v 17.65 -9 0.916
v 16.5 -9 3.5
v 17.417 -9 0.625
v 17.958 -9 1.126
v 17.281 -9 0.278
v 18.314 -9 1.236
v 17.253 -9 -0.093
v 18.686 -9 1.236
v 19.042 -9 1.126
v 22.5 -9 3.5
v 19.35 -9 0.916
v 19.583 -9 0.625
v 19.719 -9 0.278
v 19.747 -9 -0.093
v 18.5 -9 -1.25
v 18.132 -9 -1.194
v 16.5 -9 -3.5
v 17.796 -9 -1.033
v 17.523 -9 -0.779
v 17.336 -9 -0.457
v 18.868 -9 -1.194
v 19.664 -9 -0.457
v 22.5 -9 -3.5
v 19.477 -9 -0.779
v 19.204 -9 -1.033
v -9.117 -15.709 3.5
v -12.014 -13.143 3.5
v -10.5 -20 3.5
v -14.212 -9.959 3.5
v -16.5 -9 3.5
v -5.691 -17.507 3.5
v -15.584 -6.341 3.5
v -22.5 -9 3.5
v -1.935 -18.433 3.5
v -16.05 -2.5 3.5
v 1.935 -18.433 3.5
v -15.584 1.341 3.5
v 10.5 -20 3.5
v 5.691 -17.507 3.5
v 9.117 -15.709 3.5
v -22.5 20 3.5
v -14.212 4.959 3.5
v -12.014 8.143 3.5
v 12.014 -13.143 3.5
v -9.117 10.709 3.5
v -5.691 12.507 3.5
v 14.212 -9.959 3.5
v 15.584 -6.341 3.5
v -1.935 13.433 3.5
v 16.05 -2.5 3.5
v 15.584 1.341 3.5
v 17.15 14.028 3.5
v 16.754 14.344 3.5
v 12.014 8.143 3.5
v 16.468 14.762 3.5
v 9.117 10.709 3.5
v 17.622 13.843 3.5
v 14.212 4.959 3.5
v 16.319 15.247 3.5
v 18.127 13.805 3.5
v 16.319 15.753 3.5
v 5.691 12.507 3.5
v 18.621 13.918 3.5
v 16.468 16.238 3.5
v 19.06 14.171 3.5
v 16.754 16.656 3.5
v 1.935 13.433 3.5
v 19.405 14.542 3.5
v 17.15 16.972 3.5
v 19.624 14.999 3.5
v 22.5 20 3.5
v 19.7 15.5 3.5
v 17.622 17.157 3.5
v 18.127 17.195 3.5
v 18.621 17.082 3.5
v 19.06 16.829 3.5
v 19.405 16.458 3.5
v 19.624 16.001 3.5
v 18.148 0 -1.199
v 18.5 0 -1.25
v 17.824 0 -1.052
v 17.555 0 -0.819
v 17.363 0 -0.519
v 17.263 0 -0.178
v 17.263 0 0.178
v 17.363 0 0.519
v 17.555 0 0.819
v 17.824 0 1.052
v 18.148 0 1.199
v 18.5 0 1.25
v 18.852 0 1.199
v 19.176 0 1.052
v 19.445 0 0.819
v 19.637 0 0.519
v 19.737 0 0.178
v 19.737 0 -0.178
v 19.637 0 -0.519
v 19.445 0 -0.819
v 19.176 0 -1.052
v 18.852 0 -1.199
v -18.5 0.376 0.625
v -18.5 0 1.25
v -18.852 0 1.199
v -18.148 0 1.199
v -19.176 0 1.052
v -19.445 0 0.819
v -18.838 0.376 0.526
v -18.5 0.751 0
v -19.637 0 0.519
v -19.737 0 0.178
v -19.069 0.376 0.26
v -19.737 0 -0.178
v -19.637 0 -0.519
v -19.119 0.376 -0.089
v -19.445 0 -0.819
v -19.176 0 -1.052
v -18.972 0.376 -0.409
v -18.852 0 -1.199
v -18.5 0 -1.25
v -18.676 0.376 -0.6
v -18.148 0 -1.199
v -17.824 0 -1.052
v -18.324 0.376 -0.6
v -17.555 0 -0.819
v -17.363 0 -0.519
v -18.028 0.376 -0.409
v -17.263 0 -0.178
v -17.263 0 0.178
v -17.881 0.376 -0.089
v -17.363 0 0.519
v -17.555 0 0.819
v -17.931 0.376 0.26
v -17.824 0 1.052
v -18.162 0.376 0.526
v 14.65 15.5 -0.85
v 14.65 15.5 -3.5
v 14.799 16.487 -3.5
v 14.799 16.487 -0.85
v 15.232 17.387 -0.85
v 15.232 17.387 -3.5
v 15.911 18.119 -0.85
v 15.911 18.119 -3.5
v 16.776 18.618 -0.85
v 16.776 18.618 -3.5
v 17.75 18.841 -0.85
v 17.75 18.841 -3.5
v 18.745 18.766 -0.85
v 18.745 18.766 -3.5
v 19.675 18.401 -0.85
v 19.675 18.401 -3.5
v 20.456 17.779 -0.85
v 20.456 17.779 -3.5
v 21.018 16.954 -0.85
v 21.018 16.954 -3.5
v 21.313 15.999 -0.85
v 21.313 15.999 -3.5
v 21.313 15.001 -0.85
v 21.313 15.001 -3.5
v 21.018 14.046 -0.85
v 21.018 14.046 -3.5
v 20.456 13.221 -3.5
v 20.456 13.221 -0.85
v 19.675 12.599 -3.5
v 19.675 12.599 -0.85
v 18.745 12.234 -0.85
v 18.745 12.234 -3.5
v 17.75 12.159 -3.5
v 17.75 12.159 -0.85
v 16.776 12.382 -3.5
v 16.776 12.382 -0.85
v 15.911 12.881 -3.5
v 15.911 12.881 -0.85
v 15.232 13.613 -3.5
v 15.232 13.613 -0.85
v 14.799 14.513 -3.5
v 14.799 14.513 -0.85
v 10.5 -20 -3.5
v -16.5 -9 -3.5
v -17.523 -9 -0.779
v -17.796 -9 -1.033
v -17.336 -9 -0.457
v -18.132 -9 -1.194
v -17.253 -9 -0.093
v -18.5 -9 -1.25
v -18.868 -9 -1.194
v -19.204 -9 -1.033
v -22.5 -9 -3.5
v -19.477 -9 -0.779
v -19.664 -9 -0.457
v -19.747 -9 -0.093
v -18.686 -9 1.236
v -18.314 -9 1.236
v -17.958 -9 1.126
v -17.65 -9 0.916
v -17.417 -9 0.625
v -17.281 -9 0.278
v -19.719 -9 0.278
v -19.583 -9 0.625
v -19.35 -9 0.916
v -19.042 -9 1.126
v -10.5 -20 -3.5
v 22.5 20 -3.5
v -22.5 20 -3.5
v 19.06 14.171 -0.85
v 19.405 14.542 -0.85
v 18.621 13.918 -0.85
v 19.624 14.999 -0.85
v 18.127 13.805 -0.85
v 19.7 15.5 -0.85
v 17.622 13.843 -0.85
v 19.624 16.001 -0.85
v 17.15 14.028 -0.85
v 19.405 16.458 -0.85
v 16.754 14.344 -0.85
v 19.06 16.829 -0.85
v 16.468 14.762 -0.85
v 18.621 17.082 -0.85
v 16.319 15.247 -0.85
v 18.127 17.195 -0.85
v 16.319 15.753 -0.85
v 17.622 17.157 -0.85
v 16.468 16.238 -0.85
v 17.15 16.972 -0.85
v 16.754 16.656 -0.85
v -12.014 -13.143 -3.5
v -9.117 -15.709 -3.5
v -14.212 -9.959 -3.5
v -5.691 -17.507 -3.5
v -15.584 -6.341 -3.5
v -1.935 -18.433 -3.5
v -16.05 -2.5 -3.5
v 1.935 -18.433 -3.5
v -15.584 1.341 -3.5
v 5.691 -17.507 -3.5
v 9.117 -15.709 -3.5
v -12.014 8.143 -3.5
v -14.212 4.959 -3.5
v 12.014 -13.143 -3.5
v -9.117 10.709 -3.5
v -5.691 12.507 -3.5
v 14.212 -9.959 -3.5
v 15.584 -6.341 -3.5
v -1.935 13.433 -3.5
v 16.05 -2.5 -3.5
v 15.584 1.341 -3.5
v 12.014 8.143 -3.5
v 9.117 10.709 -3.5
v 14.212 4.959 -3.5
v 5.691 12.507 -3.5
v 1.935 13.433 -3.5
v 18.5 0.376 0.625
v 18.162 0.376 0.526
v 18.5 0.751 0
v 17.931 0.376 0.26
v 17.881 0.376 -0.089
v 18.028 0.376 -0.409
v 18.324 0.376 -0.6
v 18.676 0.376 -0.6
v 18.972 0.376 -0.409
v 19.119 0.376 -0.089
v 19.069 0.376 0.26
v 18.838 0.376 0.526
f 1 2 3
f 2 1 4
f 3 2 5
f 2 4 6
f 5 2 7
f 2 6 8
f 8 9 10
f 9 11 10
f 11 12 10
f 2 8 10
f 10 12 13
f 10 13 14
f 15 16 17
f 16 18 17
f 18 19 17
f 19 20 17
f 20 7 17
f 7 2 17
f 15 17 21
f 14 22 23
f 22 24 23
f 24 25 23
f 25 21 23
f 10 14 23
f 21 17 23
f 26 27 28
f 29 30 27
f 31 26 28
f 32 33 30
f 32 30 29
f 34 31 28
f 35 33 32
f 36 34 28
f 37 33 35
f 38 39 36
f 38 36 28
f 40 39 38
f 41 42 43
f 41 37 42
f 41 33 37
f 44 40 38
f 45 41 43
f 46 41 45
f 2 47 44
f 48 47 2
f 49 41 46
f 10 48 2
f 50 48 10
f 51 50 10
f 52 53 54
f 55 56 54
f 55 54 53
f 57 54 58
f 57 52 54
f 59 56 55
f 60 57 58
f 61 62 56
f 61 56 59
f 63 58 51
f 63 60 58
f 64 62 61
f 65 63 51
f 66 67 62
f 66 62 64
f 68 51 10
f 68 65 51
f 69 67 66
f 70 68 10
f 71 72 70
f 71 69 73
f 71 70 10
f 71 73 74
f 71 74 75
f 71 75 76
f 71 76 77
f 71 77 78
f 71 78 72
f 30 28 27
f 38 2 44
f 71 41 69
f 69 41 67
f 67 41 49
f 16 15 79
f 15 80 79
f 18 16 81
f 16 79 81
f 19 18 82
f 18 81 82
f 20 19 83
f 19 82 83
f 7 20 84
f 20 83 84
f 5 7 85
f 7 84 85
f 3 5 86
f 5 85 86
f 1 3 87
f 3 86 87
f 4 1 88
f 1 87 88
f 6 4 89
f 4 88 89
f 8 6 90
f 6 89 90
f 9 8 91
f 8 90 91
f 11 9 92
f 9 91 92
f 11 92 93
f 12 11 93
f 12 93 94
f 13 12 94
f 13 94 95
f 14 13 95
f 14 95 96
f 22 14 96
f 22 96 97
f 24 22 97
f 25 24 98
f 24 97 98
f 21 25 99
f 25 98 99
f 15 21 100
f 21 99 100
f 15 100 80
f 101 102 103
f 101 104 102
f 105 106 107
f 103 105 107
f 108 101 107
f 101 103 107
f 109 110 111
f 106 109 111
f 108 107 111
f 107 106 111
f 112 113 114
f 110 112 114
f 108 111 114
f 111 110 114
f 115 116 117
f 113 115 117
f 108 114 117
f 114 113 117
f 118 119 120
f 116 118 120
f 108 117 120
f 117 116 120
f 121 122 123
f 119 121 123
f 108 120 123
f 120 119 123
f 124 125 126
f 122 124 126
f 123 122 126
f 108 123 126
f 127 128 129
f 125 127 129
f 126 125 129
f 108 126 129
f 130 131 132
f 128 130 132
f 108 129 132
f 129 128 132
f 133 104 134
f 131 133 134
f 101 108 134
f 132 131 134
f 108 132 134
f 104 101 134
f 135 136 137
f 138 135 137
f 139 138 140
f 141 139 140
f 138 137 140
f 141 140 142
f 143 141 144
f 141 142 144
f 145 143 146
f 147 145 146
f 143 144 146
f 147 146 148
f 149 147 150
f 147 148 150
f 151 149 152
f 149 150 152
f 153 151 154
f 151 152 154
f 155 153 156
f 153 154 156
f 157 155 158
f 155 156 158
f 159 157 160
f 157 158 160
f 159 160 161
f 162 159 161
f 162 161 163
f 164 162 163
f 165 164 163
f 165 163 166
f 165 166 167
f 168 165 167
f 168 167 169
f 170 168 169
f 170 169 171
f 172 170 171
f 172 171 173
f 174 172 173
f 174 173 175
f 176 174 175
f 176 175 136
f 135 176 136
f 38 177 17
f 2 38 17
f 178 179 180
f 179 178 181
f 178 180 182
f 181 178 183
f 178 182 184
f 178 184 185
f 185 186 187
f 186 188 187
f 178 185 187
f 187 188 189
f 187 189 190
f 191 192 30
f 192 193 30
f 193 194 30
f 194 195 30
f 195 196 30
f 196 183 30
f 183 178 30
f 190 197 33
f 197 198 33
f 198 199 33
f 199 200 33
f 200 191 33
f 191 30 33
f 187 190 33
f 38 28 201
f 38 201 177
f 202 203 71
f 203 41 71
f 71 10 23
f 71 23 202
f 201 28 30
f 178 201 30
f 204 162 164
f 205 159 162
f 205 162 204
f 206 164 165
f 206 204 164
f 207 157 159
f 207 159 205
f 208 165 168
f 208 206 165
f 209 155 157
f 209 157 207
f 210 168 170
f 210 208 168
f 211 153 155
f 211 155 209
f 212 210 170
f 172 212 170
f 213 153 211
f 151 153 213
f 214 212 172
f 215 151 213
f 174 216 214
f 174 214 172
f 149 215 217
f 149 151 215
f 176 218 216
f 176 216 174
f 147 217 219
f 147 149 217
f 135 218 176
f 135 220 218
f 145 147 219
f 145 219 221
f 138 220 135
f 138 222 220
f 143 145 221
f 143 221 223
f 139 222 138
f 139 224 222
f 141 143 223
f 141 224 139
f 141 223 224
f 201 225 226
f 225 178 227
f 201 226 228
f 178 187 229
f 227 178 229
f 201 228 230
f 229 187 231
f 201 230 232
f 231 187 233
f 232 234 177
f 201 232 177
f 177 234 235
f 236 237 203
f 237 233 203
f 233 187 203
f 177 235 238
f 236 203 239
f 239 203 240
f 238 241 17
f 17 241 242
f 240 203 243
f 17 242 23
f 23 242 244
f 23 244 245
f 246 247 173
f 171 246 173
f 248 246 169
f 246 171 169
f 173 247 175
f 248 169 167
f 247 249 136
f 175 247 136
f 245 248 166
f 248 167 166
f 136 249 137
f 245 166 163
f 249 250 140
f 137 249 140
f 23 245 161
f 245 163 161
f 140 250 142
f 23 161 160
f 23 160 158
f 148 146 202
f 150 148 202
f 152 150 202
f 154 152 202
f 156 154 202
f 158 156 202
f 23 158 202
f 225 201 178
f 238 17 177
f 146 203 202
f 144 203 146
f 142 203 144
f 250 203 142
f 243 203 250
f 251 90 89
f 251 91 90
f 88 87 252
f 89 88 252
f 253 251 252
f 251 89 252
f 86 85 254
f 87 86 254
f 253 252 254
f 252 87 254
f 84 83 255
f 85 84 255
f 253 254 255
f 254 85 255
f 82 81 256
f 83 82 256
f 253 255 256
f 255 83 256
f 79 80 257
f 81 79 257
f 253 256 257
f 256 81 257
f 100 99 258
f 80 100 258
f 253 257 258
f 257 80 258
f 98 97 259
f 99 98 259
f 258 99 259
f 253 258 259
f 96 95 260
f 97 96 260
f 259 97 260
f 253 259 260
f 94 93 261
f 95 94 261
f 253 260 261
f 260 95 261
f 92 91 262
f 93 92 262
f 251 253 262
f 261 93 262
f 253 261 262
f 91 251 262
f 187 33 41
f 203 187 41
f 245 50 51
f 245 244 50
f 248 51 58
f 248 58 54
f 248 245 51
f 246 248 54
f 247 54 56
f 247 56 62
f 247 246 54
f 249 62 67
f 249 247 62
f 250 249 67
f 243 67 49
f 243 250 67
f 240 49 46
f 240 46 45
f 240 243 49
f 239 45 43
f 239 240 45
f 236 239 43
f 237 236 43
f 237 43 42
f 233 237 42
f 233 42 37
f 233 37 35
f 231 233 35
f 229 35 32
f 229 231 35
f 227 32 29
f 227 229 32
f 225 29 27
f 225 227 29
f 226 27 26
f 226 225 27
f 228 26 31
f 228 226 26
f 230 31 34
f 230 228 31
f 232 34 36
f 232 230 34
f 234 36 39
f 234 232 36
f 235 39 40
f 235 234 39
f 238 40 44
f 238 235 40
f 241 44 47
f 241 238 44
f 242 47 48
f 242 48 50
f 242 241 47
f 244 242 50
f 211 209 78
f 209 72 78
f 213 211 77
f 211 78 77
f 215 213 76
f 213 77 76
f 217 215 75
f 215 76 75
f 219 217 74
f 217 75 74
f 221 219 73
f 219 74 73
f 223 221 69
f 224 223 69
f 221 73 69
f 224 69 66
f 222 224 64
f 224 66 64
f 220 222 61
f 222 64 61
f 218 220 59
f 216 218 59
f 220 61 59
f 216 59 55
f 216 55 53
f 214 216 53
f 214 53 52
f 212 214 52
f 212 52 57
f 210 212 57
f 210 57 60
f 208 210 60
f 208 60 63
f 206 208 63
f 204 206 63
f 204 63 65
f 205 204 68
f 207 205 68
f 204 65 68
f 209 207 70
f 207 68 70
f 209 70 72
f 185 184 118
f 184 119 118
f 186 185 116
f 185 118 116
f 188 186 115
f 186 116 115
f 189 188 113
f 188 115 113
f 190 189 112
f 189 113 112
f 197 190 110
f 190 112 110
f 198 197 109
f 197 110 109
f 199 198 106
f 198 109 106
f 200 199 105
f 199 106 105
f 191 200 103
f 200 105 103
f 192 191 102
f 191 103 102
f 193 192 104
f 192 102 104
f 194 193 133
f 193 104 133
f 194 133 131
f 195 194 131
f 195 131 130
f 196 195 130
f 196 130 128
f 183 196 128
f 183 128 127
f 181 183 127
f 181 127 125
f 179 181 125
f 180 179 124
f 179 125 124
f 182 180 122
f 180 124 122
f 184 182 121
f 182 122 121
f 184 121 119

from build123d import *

# Parameters (mm, degrees)
SKETCH1_W                       = 45
SKETCH1_H                       = 40
SKETCH1_R                       = 16
BOSS_EXTRUDE1_DEPTH             = 3.5
M3X0_5_TAPPED_HOLE2_D           = 2.5
M3X0_5_TAPPED_HOLE2_DEPTH       = 25
M3X0_5_TAPPED_HOLE2_TIP         = 0.751075774
CUT_EXTRUDE1_DEPTH              = 5
CBORE_FOR_M3_SBHCS1_D           = 3.4
CBORE_FOR_M3_SBHCS1_DEPTH       = 7
CBORE_FOR_M3_SBHCS1_CBORE_D     = 6.7
CBORE_FOR_M3_SBHCS1_CBORE_DEPTH = 2.65
CBORE_FOR_M3_SBHCS1_TIP         = 1.021463052
F_3D_PRINTING_TOLERANCE_BY      = 0.05


with BuildPart() as part:
    # Sketch1 → Boss-Extrude1 (new, symmetric)
    with BuildSketch(Plane.XY):
        Rectangle(SKETCH1_W, SKETCH1_H)
        with Locations((0, -2.5)):
            Circle(SKETCH1_R, mode=Mode.SUBTRACT)
    extrude(amount=BOSS_EXTRUDE1_DEPTH, both=True)

    # M3x0.5 Tapped Hole2
    with Locations(Plane(origin=(0, -25, 71.05), x_dir=(0, 0, 1), z_dir=(0, -1, 0))):
        with Locations((-41.05, -18.5), (-71.05, 18.5), (-71.05, -18.5), (-41.05, 18.5)):
            Hole(M3X0_5_TAPPED_HOLE2_D / 2, depth=M3X0_5_TAPPED_HOLE2_DEPTH)
            with Locations((0, 0, -(M3X0_5_TAPPED_HOLE2_DEPTH + M3X0_5_TAPPED_HOLE2_TIP / 2))):  # 118° drill point
                Cone(0, M3X0_5_TAPPED_HOLE2_D / 2, M3X0_5_TAPPED_HOLE2_TIP, mode=Mode.SUBTRACT)

    # Sketch7 → Cut-Extrude1 (cut, symmetric)
    with BuildSketch(Plane.XY):
        Polygon((10.5, -20), (16.5, -9), (22.5, -9), (22.5, -20), align=None)
        Polygon((-10.5, -20), (-16.5, -9), (-22.5, -9), (-22.5, -20), align=None)
    extrude(amount=CUT_EXTRUDE1_DEPTH, both=True, mode=Mode.SUBTRACT)

    # CBORE for M3 SBHCS1
    with Locations(Plane(origin=(0, -2.5, -3.5), x_dir=(-1, 0, 0), z_dir=(0, 0, -1))):
        with Locations((-18, 18)):
            CounterBoreHole(CBORE_FOR_M3_SBHCS1_D / 2, CBORE_FOR_M3_SBHCS1_CBORE_D / 2, CBORE_FOR_M3_SBHCS1_CBORE_DEPTH, depth=CBORE_FOR_M3_SBHCS1_DEPTH)
            with Locations((0, 0, -(CBORE_FOR_M3_SBHCS1_DEPTH + CBORE_FOR_M3_SBHCS1_TIP / 2))):  # 118° drill point
                Cone(0, CBORE_FOR_M3_SBHCS1_D / 2, CBORE_FOR_M3_SBHCS1_TIP, mode=Mode.SUBTRACT)

    # 3D printing tolerance: a curved face moved inward by 0.05
    add(Solid.thicken(part.faces().sort_by_distance((-16, -2.5, 0))[0], -F_3D_PRINTING_TOLERANCE_BY), mode=Mode.SUBTRACT)


solid = part.part
